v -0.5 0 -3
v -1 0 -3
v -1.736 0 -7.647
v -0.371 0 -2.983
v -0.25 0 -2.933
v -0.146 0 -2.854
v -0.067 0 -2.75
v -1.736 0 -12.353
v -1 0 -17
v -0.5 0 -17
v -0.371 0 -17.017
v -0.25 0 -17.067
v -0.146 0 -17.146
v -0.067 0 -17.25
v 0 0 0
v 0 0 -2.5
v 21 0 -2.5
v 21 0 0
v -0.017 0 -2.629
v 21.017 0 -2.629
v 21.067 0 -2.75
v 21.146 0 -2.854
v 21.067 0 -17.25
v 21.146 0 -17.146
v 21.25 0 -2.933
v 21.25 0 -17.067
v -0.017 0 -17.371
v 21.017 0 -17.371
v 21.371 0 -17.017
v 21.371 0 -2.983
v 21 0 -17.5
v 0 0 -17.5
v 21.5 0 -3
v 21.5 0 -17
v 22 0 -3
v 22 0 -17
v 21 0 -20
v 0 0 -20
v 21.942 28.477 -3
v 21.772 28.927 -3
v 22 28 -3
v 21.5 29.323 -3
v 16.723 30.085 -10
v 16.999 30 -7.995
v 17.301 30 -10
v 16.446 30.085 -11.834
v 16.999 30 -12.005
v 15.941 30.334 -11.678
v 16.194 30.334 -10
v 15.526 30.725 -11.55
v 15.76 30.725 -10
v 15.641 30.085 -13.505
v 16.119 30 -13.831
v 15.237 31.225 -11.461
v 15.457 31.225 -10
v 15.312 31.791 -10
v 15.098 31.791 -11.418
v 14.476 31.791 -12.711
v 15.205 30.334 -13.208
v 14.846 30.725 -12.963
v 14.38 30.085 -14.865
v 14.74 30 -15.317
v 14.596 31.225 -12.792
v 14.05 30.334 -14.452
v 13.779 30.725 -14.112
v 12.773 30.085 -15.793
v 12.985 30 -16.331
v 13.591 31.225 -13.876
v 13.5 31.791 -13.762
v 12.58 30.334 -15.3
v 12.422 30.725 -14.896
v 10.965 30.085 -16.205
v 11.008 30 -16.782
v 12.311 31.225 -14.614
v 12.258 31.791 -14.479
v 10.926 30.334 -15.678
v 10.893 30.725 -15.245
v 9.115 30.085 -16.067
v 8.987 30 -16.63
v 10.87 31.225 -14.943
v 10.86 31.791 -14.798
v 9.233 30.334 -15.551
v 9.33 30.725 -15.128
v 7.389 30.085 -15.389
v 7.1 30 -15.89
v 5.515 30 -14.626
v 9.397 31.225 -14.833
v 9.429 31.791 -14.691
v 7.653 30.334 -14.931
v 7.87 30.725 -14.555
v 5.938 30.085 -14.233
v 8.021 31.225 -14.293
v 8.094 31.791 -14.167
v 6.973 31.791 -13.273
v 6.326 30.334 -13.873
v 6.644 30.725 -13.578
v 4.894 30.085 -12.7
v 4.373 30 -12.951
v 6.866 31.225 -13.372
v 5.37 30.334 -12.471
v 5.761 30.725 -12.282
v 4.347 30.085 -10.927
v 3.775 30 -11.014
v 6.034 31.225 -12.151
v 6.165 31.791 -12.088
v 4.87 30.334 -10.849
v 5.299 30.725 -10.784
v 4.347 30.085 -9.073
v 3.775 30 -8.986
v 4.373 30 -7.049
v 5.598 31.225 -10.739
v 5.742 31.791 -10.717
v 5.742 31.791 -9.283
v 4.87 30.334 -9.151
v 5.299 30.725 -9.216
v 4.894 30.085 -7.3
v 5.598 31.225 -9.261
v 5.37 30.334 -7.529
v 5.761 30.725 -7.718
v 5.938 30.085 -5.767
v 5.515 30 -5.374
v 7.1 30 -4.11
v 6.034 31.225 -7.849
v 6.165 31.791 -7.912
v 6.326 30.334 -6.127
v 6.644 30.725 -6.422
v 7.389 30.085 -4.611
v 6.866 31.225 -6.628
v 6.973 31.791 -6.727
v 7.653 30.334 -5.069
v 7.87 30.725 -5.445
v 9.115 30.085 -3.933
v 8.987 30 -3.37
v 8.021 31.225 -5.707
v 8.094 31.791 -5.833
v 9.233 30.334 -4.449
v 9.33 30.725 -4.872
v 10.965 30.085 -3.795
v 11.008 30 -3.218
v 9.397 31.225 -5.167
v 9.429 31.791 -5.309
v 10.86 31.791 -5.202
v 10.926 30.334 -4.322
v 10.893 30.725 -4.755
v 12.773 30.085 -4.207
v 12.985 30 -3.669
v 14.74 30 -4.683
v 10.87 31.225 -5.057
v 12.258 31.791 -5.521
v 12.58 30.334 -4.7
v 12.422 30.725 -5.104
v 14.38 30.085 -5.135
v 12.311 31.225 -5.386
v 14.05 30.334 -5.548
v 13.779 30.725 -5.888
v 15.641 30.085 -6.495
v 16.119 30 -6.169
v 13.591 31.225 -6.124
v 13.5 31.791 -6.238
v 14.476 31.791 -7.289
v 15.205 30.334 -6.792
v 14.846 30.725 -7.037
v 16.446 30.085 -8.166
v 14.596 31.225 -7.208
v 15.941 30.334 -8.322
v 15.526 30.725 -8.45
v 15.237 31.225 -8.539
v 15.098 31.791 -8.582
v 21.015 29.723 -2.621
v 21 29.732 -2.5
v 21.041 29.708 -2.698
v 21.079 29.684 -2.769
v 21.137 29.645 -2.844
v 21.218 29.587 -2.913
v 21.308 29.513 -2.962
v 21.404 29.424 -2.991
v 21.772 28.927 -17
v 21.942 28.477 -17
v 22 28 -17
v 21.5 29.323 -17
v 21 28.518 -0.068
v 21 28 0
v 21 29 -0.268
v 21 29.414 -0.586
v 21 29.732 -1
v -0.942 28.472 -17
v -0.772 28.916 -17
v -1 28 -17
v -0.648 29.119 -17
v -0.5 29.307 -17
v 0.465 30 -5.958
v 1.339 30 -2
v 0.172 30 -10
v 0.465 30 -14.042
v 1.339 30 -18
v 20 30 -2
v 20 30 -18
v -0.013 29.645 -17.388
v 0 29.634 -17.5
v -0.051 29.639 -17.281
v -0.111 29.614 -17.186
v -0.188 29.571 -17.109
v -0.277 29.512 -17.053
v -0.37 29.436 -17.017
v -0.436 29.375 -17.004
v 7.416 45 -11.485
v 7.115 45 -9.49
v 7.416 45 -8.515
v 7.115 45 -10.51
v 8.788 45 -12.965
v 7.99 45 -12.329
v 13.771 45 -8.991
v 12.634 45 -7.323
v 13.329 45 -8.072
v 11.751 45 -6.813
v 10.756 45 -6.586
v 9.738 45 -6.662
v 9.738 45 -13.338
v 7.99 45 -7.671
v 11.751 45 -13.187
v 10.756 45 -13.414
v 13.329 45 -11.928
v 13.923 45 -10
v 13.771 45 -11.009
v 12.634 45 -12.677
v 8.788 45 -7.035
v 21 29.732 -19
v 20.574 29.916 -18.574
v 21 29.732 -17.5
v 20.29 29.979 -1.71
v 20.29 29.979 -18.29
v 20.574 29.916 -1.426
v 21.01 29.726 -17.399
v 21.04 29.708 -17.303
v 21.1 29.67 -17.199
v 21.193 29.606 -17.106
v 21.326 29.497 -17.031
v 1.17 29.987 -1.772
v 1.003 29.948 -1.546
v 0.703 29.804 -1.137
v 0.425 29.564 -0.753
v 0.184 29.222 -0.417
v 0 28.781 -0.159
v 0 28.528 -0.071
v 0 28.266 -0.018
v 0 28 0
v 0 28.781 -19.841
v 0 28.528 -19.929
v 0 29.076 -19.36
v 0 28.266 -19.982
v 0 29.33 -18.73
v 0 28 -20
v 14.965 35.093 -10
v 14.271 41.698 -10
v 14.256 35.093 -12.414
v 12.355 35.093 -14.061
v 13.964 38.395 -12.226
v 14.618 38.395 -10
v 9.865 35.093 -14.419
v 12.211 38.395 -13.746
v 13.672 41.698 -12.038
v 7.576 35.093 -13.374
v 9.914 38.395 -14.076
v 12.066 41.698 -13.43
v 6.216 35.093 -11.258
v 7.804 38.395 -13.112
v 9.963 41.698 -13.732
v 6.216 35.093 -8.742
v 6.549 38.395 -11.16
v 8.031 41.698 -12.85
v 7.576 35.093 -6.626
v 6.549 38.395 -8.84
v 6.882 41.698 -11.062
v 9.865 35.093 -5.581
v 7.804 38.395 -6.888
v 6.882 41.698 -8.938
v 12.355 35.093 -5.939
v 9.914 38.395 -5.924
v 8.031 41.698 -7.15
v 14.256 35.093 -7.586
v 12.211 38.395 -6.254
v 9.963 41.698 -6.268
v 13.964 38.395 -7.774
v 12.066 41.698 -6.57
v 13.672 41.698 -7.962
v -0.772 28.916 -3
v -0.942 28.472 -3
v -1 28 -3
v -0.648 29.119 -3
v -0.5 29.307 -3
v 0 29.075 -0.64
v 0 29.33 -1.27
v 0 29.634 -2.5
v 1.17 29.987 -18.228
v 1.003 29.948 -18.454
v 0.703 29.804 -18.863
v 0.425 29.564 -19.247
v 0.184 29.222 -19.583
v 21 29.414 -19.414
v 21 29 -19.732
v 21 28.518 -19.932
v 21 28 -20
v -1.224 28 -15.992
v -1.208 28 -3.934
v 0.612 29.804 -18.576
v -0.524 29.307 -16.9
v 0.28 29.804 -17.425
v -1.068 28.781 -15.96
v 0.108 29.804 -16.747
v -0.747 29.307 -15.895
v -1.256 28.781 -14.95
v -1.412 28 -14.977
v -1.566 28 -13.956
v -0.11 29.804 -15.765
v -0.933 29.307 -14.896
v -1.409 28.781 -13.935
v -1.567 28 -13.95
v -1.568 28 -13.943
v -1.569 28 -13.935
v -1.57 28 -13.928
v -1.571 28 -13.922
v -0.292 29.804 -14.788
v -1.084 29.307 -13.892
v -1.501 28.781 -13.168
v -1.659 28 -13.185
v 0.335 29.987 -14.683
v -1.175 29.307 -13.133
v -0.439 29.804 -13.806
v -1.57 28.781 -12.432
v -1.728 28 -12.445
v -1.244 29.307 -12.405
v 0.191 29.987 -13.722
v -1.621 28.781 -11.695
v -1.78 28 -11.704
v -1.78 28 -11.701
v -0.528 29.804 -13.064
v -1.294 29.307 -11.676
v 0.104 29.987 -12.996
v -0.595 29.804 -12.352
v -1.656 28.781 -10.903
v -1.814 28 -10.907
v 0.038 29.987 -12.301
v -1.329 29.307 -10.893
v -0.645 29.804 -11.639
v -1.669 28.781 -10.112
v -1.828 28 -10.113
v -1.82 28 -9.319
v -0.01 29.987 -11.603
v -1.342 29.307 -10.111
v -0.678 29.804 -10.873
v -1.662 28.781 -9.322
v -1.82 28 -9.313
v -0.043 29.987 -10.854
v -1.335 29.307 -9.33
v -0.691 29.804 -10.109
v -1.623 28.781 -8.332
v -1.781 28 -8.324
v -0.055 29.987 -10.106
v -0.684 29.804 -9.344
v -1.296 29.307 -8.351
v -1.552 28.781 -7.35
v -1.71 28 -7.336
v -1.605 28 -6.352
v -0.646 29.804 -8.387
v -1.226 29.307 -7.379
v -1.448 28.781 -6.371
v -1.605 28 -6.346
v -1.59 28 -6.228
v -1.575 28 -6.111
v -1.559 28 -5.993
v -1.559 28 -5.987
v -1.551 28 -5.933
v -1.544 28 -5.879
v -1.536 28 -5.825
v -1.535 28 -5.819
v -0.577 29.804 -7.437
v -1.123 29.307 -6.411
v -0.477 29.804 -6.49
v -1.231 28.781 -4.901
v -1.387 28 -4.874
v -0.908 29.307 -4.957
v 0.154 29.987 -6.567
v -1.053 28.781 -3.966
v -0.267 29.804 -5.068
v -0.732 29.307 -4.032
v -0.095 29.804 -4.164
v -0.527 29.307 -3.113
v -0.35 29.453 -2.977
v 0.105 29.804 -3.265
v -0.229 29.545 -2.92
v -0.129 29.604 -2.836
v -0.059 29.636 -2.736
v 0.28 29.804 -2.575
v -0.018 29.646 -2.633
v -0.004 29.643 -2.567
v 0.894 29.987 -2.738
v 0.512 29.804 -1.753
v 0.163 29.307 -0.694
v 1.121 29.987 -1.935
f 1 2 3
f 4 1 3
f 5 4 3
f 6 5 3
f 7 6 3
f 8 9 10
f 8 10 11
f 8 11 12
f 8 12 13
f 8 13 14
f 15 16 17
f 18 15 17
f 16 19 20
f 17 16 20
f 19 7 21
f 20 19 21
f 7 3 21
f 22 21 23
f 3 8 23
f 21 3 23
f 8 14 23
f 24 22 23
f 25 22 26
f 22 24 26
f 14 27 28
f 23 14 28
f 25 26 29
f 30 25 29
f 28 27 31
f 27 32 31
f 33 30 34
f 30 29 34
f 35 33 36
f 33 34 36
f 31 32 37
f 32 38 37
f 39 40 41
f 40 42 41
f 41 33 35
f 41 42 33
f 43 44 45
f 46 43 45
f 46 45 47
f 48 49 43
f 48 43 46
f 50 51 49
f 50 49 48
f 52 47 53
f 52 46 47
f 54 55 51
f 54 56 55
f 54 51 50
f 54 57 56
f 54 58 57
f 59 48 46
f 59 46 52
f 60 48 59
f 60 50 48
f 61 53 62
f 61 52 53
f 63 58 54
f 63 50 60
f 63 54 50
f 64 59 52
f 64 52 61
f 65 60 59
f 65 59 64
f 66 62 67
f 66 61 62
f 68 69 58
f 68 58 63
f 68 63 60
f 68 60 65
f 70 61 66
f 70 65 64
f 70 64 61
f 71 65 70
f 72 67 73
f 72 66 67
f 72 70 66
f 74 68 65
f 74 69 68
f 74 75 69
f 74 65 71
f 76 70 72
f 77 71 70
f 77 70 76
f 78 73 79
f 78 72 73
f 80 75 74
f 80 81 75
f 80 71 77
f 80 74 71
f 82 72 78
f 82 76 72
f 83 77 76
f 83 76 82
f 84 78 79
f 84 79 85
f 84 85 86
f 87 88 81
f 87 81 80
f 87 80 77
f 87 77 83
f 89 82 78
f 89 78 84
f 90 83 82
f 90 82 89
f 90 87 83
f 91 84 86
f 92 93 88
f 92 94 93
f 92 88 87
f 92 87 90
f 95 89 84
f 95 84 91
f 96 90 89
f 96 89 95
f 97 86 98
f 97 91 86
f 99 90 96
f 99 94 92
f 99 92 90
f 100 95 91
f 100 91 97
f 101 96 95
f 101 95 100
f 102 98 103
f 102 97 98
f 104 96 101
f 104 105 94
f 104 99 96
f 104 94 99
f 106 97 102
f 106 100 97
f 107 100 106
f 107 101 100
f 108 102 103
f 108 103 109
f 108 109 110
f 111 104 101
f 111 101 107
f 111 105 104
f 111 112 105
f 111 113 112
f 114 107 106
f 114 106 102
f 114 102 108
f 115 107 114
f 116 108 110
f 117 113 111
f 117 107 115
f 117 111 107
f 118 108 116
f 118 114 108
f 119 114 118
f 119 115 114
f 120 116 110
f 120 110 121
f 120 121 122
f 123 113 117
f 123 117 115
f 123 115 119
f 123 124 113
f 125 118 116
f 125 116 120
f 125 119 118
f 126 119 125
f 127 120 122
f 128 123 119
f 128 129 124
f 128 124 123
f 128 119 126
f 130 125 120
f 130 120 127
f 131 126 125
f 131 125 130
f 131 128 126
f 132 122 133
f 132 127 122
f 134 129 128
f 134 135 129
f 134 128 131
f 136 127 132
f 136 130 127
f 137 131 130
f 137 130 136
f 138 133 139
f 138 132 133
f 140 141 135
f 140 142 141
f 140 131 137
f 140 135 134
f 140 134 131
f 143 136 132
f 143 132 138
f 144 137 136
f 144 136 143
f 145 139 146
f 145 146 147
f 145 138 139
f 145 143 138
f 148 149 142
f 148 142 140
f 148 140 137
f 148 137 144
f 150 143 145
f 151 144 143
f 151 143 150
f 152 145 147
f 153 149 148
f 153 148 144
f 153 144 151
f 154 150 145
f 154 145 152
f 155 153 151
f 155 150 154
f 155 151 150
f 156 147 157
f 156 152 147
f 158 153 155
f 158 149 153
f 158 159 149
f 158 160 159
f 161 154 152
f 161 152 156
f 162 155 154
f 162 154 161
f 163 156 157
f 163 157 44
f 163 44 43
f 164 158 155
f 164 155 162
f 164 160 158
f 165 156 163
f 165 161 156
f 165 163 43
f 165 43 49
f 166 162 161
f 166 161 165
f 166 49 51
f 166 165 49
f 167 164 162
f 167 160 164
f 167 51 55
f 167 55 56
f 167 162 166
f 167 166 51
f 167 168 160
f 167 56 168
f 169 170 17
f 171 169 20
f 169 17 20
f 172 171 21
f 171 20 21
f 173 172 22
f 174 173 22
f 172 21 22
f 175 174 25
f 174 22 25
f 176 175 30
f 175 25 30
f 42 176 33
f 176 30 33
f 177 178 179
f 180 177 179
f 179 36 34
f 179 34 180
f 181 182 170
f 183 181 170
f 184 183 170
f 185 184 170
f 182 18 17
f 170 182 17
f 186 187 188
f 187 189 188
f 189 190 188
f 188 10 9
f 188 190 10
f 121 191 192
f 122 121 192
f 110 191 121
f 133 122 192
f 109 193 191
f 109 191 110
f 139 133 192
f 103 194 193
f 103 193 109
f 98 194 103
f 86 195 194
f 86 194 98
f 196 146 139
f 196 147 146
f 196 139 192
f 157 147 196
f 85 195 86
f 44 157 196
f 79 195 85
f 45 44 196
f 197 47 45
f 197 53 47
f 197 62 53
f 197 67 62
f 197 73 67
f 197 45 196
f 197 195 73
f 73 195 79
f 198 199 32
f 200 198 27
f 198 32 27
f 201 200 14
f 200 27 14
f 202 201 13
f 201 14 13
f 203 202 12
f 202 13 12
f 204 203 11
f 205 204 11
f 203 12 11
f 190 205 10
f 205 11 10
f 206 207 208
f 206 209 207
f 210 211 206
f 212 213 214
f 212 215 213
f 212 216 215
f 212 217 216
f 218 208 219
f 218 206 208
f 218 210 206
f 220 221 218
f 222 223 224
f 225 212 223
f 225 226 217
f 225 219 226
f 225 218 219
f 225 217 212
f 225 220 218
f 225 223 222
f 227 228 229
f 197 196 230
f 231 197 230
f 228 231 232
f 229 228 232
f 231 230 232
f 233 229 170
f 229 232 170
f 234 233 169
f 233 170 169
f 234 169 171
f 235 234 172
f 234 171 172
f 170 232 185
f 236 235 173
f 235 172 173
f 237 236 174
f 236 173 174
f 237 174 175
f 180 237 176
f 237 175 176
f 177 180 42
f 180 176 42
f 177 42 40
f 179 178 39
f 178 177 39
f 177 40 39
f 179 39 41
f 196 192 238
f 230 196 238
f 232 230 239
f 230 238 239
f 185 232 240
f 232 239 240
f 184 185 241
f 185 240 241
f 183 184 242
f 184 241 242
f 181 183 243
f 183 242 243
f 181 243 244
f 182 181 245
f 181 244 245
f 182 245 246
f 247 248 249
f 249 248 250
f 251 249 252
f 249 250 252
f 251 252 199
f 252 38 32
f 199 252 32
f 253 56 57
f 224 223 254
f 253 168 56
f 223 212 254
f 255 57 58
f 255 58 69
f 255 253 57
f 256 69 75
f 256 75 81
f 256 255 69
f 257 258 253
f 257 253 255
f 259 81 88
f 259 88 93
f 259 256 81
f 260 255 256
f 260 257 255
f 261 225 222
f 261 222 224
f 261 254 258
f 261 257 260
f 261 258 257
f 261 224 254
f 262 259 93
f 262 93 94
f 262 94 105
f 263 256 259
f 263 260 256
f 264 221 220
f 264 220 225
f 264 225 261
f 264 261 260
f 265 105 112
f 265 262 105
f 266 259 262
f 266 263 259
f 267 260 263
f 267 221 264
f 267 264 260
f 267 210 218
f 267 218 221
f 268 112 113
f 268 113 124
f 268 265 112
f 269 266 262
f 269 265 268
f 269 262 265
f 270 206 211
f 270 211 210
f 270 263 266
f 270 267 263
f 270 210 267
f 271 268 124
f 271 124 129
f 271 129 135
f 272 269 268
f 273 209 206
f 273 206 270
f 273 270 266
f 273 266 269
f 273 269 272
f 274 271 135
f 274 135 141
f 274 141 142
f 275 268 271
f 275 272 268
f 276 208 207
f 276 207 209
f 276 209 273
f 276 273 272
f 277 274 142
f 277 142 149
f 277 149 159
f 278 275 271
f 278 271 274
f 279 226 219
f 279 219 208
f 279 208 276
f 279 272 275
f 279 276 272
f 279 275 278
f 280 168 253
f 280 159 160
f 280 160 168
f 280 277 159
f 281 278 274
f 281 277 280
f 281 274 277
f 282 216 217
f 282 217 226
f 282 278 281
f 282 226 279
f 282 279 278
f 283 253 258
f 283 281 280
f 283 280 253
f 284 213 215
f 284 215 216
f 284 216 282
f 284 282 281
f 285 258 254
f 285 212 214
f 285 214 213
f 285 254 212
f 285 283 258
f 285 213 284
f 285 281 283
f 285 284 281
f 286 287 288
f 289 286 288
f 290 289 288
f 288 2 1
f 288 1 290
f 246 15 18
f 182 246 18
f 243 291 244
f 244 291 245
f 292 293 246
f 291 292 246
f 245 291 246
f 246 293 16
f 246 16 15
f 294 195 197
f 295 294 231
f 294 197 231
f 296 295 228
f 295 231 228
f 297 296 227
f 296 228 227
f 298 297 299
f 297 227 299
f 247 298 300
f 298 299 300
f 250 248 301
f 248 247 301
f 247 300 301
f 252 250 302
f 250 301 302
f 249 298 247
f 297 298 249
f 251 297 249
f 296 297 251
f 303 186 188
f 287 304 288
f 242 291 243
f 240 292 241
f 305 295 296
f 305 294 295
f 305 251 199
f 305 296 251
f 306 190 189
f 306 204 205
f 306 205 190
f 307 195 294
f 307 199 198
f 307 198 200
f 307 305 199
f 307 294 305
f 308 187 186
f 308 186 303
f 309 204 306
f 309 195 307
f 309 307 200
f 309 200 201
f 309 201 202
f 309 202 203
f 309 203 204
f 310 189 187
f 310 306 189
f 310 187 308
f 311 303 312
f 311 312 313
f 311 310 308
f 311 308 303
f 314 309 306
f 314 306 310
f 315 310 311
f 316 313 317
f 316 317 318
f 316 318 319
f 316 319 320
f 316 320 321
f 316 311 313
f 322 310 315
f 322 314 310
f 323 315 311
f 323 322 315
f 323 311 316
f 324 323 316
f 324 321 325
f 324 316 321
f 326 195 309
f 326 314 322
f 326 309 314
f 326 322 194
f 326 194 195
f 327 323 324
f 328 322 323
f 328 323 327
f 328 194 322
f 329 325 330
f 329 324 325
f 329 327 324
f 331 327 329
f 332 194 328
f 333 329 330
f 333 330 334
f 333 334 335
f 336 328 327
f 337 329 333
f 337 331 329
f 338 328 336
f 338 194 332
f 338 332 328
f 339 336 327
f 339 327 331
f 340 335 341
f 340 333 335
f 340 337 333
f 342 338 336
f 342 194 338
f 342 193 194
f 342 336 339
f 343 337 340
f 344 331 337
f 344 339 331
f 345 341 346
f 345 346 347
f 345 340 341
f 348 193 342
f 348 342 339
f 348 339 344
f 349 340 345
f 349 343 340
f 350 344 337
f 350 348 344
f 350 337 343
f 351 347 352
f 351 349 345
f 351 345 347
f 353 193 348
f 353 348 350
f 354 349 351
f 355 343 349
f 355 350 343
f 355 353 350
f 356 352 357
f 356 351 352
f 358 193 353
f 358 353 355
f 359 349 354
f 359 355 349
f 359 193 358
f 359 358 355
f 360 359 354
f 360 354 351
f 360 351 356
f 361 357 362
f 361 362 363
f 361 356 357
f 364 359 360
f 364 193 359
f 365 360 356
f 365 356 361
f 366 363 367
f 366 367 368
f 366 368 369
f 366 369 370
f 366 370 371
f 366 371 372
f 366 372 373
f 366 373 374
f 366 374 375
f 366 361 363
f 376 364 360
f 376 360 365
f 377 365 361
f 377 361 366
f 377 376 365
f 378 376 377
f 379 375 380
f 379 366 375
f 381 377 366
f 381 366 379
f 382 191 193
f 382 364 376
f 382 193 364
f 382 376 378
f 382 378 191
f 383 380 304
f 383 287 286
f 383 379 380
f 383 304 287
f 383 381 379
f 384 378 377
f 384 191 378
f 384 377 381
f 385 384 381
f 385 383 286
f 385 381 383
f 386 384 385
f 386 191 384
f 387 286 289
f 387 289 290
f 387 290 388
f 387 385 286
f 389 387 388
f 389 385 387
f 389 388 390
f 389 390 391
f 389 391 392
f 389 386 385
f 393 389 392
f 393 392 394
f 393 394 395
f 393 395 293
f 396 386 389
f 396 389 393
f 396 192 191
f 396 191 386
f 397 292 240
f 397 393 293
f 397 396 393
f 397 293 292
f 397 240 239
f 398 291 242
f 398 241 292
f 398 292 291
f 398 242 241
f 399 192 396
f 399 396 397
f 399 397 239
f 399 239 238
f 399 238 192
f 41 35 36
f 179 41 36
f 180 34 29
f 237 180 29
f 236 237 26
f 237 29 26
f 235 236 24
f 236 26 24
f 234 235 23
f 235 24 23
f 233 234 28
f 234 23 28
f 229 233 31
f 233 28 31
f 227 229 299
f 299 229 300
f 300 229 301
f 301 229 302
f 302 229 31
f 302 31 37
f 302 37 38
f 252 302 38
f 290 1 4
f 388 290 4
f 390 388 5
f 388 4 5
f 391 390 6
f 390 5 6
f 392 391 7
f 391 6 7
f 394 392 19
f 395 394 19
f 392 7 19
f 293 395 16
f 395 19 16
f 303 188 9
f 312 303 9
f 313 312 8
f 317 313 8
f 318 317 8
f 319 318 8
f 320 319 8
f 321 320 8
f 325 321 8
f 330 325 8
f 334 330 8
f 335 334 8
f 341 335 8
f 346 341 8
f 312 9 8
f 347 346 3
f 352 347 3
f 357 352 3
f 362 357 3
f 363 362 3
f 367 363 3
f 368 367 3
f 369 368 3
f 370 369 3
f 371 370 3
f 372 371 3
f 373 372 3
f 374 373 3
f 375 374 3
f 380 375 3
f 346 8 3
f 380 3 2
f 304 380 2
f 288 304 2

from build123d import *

# Parameters (mm, degrees)
SALIENTE_EXTRUIR1_DEPTH = 30
CROQUIS2_R              = 5
SALIENTE_EXTRUIR2_DEPTH = 15
SALIENTE_EXTRUIR2_TAPER = 6
REDONDEO1_R             = 2
REDONDEO2_R             = 2


with BuildPart() as part:
    # Croquis1 → Saliente-Extruir1 (new body)
    with BuildSketch(Plane(origin=(0, 0, 0), x_dir=(1, 0, 0), z_dir=(0, 1, 0))):
        with BuildLine():
            Line((0, 2.5), (0, 0))
            Line((0, 0), (10.5, 0))
            Line((10.5, 0), (10.5, 20))
            Line((10.5, 20), (0, 20))
            Line((0, 20), (0, 17.5))
            ThreePointArc((0, 17.5), (-0.146446609, 17.146446609), (-0.5, 17))
            Line((-0.5, 17), (-1, 17))
            ThreePointArc((-1, 17), (-1.828095708, 10), (-1, 3))
            Line((-1, 3), (-0.5, 3))
            ThreePointArc((-0.5, 3), (-0.146446609, 2.853553391), (0, 2.5))
        make_face()
        with BuildLine():
            Line((10.5, 20), (10.5, 0))
            Line((10.5, 0), (21, 0))
            Line((21, 0), (21, 2.5))
            ThreePointArc((21, 2.5), (21.146446609, 2.853553391), (21.5, 3))
            Line((21.5, 3), (22, 3))
            Line((22, 3), (22, 17))
            Line((22, 17), (21.5, 17))
            ThreePointArc((21.5, 17), (21.146446609, 17.146446609), (21, 17.5))
            Line((21, 17.5), (21, 20))
            Line((21, 20), (10.5, 20))
        make_face()
    extrude(amount=SALIENTE_EXTRUIR1_DEPTH)

    # Croquis2 → Saliente-Extruir2 (add)
    with BuildSketch(Plane(origin=(0, 30, 0), x_dir=(1, 0, 0), z_dir=(0, 1, 0))):
        with Locations((10.5, 10)):
            Circle(CROQUIS2_R)
    extrude(amount=SALIENTE_EXTRUIR2_DEPTH, taper=SALIENTE_EXTRUIR2_TAPER)

    # Redondeo1
    # the kernel refuses this fillet: 2 mm, written as the material it takes off along each edge
    with BuildSketch(Plane(origin=(26, 30, -20), x_dir=(0, 0, 1), z_dir=(-1, 0, 0)), Plane(origin=(-5, 30, 0), x_dir=(0, 0, -1), z_dir=(1, 0, 0))) as redondeo1_piece_1:
        with BuildLine():
            CenterArc((REDONDEO1_R, -REDONDEO1_R), REDONDEO1_R, 90, 90)
            Line((0, -REDONDEO1_R), (0, 0))
            Line((0, 0), (REDONDEO1_R, 0))
        make_face()
    extrude(amount=31, mode=Mode.SUBTRACT)
    with BuildSketch(Plane(origin=(22, 30, 2), x_dir=(-1, 0, 0), z_dir=(0, 0, -1))) as redondeo1_piece_2:
        with BuildLine():
            CenterArc((REDONDEO1_R, -REDONDEO1_R), REDONDEO1_R, 90, 90)
            Line((0, -REDONDEO1_R), (0, 0))
            Line((0, 0), (REDONDEO1_R, 0))
        make_face()
    extrude(amount=24, mode=Mode.SUBTRACT)
    with BuildSketch(Plane(origin=(28.171904292, 30, -10), x_dir=(-0.92021107903263, 0, -0.391422495553849), z_dir=(0.391422495553849, 0, -0.92021107903263))) as redondeo1_piece_3:
        with BuildLine():
            CenterArc((30 - REDONDEO1_R, -REDONDEO1_R), REDONDEO1_R, 0, 90)
            Line((30 - REDONDEO1_R, 0), (30, 0))
            Line((30, 0), (30, -REDONDEO1_R))
        make_face()
    revolve(axis=Axis((28.171904292, 30, -10), (0, 1, 0)), revolution_arc=46.086080448, mode=Mode.SUBTRACT)

    # Redondeo2
    redondeo2_edges = [part.edges().sort_by_distance(p)[0] for p in [
        (5.5, 30, -10),
    ]]
    fillet(redondeo2_edges, radius=REDONDEO2_R)


solid = part.part
